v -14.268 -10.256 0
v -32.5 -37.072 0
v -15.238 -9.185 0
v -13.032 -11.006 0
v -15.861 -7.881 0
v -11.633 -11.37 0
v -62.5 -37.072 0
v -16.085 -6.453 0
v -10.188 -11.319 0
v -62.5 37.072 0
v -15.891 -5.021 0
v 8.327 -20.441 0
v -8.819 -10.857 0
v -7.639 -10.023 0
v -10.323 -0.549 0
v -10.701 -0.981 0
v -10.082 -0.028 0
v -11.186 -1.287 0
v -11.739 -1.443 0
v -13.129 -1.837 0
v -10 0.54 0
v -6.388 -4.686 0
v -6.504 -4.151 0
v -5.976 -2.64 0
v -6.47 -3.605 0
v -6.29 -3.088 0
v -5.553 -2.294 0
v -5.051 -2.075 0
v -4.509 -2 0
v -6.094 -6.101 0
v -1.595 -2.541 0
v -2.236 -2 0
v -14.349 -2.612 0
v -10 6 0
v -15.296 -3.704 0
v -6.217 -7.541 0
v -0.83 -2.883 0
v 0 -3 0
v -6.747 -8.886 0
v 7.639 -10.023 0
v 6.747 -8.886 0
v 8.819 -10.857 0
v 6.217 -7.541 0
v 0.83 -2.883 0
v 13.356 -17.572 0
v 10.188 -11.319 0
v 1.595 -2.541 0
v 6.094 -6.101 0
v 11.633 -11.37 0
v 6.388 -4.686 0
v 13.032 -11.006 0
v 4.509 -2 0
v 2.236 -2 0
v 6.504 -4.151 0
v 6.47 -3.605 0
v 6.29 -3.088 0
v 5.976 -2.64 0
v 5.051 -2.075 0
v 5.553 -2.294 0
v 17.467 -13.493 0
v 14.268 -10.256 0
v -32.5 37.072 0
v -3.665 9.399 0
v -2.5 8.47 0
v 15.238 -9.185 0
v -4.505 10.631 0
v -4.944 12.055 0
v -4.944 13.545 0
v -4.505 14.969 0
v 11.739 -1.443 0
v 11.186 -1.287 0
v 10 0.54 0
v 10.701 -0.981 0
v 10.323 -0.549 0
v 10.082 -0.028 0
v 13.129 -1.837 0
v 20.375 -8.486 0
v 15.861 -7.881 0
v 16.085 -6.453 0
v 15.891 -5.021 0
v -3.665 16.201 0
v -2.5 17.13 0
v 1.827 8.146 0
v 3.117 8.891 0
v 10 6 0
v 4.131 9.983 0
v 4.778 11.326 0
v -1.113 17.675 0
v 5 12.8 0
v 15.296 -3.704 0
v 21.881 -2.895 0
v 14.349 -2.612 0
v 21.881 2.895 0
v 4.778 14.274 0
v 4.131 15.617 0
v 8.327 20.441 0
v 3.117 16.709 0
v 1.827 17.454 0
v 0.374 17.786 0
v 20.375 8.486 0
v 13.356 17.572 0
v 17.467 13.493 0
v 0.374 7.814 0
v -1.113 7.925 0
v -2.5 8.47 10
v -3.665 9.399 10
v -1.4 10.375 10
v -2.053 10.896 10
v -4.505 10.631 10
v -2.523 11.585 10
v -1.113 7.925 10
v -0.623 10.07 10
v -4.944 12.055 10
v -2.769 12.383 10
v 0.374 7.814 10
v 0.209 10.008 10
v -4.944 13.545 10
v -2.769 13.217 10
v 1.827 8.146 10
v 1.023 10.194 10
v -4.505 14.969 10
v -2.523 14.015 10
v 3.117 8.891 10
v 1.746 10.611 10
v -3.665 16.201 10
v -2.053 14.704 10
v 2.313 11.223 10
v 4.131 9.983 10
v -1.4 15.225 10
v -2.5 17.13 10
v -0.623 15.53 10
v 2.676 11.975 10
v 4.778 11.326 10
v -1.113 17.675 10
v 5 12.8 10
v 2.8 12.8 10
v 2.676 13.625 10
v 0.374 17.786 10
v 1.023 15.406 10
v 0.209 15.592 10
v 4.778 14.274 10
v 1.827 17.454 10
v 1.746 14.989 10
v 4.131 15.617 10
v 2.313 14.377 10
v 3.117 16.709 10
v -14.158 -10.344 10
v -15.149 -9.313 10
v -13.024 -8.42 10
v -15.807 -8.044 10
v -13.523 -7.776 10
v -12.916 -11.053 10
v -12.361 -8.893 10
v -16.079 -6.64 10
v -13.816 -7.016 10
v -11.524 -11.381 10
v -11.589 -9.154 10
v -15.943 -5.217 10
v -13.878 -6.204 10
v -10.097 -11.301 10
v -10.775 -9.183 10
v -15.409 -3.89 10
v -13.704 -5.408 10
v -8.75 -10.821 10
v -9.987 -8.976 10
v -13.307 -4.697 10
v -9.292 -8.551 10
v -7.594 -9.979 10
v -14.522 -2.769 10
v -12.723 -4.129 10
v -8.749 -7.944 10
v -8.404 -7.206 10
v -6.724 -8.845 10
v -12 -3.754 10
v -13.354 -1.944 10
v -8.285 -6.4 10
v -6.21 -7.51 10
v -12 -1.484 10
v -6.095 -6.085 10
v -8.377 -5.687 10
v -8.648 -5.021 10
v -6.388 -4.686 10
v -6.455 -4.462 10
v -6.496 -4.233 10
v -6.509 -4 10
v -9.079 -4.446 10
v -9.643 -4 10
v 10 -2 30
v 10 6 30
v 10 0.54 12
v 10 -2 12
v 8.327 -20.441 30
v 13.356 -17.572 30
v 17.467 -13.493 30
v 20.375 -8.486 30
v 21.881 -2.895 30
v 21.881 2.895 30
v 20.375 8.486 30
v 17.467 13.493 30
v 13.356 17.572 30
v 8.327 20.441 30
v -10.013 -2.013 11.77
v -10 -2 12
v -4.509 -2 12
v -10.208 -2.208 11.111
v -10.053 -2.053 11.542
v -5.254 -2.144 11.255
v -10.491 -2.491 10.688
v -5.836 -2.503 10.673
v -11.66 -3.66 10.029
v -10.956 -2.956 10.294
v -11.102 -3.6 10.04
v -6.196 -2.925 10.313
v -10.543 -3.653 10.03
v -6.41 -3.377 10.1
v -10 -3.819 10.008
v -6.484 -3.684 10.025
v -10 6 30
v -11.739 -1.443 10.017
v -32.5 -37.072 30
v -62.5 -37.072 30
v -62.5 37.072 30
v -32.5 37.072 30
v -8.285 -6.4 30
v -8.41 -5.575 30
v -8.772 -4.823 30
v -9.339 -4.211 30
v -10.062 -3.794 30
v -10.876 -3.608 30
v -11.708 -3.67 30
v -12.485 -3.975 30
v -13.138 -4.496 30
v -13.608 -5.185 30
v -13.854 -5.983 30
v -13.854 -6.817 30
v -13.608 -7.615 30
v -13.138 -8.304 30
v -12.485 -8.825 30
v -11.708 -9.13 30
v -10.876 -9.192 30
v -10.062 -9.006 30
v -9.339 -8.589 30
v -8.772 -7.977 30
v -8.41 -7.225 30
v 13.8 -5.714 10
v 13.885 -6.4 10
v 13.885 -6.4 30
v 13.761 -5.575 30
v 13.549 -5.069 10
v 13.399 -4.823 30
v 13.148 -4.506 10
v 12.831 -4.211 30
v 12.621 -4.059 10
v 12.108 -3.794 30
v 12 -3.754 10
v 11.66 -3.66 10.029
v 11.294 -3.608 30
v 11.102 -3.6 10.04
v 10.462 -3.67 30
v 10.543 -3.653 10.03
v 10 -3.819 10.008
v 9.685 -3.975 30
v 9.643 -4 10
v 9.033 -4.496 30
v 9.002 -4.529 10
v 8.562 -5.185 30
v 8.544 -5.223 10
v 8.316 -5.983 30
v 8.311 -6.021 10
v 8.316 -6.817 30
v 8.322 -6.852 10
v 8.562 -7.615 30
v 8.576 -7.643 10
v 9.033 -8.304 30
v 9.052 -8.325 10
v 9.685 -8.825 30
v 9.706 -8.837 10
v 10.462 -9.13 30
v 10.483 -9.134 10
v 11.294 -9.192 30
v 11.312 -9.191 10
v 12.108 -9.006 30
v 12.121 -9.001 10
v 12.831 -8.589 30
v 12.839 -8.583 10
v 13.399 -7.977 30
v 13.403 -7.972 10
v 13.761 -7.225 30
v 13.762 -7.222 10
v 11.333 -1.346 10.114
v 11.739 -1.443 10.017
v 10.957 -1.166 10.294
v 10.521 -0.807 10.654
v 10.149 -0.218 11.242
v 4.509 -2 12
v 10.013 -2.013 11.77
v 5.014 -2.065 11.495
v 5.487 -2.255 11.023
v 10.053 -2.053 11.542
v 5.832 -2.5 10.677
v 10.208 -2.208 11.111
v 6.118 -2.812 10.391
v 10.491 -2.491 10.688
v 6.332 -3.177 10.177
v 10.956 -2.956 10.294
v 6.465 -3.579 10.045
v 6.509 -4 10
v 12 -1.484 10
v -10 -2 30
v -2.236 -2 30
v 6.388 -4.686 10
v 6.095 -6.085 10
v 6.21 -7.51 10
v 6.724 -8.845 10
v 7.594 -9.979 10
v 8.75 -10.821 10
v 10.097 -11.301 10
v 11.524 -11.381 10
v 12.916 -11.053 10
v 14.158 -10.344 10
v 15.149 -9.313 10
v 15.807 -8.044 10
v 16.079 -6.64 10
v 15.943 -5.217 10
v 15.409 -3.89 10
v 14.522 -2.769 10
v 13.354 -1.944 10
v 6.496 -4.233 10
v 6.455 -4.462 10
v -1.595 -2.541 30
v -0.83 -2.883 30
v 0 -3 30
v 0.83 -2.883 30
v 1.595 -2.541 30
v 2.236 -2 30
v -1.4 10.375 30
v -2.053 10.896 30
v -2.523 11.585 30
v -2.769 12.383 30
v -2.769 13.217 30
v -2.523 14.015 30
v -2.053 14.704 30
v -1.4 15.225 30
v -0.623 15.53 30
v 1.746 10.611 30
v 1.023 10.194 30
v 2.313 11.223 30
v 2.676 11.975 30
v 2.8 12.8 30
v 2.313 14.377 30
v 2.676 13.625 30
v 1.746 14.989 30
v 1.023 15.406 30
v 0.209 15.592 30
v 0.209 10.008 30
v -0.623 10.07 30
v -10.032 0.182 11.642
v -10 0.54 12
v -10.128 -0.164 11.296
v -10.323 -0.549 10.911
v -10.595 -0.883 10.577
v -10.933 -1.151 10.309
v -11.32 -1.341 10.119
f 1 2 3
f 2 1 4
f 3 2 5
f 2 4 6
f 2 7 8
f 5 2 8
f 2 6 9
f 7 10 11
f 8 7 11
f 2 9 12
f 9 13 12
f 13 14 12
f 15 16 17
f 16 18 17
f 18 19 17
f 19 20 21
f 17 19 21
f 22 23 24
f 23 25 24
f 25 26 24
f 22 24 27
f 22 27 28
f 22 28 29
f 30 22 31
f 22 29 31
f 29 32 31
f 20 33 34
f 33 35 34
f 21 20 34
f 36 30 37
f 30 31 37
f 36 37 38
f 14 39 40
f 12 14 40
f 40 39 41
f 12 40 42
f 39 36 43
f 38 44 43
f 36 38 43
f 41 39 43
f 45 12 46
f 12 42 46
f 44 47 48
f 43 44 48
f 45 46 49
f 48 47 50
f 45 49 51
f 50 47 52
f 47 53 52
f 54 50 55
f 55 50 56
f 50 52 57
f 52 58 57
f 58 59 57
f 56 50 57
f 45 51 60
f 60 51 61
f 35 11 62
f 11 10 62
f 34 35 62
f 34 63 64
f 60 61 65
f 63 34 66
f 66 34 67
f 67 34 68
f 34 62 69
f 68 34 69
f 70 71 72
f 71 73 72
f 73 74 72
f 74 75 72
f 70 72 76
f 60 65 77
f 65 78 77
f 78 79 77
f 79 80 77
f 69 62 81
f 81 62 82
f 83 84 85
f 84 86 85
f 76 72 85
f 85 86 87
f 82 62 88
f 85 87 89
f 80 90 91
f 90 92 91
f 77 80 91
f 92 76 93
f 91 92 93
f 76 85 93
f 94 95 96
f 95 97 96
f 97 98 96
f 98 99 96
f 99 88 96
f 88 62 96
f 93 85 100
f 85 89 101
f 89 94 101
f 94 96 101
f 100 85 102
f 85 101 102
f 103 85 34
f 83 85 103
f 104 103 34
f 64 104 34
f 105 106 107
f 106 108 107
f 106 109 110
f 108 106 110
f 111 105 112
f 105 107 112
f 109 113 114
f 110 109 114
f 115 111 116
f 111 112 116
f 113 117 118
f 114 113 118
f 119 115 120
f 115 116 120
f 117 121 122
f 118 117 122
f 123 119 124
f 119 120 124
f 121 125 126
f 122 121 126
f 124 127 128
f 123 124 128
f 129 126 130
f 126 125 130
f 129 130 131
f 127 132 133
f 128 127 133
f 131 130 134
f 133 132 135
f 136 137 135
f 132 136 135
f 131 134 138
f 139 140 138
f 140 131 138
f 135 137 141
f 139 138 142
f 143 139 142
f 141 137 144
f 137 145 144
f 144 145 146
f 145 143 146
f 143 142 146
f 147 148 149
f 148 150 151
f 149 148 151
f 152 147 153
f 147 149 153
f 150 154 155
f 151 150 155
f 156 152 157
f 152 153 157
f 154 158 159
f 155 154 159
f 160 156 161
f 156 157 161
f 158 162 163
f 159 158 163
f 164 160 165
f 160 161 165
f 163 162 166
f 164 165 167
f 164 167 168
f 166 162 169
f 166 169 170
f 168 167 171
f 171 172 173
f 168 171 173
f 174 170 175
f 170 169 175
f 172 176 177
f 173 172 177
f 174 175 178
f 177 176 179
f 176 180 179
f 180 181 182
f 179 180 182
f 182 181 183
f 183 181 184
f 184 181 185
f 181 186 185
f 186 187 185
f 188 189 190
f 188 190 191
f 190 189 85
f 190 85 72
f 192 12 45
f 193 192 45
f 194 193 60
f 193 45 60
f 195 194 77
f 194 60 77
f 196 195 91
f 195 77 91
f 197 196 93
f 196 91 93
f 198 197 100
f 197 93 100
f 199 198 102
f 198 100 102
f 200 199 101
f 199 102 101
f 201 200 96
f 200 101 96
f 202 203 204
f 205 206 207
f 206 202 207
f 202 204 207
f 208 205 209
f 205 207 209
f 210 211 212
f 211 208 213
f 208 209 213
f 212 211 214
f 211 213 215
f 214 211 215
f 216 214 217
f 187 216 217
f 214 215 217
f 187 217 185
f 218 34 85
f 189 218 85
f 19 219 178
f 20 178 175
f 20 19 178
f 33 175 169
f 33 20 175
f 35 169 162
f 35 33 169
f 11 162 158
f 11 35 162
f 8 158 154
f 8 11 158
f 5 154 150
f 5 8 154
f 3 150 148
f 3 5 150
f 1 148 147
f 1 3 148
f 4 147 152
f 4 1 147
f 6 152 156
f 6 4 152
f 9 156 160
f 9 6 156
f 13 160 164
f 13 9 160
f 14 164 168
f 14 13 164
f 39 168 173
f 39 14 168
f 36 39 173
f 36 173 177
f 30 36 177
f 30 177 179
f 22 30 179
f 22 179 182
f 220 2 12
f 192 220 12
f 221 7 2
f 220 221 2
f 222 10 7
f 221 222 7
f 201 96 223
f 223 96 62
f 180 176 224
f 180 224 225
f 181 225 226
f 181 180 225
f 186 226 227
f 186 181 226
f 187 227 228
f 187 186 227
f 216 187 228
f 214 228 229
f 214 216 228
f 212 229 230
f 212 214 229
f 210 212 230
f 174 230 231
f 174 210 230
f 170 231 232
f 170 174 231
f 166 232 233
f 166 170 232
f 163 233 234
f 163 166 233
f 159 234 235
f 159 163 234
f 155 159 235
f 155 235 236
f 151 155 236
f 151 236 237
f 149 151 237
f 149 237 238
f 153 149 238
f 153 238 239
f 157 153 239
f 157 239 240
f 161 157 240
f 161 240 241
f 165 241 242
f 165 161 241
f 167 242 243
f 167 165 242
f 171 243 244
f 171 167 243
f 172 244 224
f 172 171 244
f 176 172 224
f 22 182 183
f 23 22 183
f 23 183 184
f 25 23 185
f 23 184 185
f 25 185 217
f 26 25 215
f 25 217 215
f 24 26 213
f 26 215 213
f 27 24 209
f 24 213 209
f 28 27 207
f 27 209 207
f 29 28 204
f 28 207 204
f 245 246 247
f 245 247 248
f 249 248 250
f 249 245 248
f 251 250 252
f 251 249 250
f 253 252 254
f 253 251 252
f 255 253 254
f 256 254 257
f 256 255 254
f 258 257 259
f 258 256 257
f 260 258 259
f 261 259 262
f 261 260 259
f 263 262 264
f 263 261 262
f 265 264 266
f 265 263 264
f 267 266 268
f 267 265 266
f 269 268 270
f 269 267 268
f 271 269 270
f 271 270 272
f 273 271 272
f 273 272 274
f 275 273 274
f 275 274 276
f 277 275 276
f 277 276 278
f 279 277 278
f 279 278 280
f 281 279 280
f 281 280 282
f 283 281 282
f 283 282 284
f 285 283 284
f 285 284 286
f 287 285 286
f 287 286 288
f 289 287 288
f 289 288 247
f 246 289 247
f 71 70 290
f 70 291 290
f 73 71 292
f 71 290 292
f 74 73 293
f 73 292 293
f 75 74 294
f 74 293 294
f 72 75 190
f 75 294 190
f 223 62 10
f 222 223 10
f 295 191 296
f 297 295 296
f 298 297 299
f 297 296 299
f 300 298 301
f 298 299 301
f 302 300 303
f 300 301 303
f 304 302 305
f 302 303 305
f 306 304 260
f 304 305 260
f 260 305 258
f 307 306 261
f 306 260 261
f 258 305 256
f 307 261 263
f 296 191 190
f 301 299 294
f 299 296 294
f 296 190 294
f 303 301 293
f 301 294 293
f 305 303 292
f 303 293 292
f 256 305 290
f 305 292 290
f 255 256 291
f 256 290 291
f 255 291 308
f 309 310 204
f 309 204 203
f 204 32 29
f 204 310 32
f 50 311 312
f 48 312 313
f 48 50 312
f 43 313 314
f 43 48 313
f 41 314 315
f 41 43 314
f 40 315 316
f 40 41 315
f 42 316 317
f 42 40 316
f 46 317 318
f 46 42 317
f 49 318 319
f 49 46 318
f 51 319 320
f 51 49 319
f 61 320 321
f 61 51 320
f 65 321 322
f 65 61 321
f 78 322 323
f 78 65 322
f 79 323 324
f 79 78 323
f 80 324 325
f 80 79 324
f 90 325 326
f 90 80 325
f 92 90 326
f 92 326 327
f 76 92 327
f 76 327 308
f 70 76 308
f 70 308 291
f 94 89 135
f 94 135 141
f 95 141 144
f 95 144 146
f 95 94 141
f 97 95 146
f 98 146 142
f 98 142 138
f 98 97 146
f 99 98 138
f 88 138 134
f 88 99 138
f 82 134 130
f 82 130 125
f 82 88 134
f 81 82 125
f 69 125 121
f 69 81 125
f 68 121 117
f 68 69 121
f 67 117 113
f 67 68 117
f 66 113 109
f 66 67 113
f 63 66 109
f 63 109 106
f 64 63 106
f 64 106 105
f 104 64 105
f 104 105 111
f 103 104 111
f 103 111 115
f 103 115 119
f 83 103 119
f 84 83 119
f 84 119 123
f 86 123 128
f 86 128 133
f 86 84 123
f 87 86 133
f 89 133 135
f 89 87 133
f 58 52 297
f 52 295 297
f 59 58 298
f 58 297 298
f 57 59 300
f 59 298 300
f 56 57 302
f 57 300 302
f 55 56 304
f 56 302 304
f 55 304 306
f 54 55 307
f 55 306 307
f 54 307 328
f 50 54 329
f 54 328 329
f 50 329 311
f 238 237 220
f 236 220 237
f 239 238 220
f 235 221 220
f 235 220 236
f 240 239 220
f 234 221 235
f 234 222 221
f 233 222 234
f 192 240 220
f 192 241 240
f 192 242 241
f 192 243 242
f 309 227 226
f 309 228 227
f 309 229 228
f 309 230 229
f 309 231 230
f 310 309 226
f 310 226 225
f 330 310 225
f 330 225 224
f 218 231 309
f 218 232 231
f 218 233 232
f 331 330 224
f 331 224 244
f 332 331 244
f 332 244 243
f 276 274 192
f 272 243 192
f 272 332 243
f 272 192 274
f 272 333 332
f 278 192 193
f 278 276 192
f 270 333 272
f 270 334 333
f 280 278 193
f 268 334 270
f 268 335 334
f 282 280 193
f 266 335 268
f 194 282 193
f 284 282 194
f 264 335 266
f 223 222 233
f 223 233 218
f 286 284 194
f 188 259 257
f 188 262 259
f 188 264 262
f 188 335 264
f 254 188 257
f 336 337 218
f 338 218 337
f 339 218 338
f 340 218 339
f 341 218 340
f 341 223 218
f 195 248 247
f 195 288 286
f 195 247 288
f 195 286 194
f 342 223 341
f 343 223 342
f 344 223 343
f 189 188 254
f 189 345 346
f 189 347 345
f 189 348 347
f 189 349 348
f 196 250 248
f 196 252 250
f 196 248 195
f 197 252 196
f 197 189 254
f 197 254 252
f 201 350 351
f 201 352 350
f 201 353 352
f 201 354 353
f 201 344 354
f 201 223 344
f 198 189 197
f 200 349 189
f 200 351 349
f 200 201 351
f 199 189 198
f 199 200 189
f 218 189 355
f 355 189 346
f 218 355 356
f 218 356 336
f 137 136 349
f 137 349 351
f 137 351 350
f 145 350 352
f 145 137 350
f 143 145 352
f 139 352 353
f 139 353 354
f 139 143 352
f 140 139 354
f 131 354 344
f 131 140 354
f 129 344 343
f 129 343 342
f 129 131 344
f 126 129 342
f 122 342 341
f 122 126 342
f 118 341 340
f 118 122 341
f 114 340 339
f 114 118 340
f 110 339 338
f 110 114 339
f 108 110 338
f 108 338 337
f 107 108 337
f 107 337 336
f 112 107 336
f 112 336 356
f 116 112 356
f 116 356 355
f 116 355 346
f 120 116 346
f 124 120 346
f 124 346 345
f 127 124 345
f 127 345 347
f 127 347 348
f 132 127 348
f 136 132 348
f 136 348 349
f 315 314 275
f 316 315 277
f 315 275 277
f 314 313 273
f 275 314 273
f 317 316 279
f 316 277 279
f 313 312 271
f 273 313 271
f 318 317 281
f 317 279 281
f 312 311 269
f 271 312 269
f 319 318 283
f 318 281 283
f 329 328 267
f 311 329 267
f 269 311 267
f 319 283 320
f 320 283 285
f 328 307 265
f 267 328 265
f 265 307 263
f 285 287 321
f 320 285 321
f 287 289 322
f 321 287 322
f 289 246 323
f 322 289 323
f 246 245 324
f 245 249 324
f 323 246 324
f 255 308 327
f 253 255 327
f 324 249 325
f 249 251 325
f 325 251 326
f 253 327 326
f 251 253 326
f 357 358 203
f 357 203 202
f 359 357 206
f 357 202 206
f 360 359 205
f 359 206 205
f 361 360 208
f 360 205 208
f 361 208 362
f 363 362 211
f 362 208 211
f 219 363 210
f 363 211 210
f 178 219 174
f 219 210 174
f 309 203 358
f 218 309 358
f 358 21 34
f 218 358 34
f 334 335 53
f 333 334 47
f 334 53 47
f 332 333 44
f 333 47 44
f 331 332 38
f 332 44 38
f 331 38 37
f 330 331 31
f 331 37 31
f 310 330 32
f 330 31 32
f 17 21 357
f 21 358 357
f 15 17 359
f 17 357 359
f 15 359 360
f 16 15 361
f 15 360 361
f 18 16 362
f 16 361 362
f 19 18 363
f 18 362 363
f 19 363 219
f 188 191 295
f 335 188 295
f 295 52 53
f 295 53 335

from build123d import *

# Parameters (mm, degrees)
SKETCH_1_R          = 22.07163906423819
SKETCH_1_R_2        = 2.8
SKETCH_1_R_3        = 2.8000000000000003
EXTRUDE_1_DEPTH     = 5
SKETCH_2_R          = 22.07163906423819
SKETCH_2_R_2        = 2.8000000000000003
SKETCH_2_R_3        = 2.8
EXTRUDE_2_DEPTH     = 30
SKETCH_3_R          = 4.999999999999998
SKETCH_3_R_2        = 2.8000000000000003
SKETCH_3_R_3        = 5.000000000000001
SKETCH_3_R_4        = 2.8
SKETCH_3_R_5        = 5
CUT_EXTRUDE_1_DEPTH = 10
FILLET_2_R          = 2
FILLET_3_R          = 2


with BuildPart() as part:
    # 스케치1 → 보스-돌출1 (new body)
    with BuildSketch(Plane.XY):
        Circle(SKETCH_1_R)
        with Locations((0, 12.8)):
            Circle(SKETCH_1_R_2, mode=Mode.SUBTRACT)
        with Locations((-11.085125168440811, -6.400000000000006)):
            Circle(SKETCH_1_R_3, mode=Mode.SUBTRACT)
        with Locations((11.085125168440817, -6.399999999999997)):
            Circle(SKETCH_1_R_3, mode=Mode.SUBTRACT)
        with BuildLine():
            Line((-9.999999999999998, 5.9999999999999964), (10.000000000000002, 6.0000000000000036))
            Line((10.000000000000002, 6.0000000000000036), (10.000000000000004, -1.9999999999999964))
            Line((10.000000000000004, -1.9999999999999973), (2.236067977499654, -1.9999999999999998))
            ThreePointArc((2.236067977499691, -2.00000000000011), (-3.785e-14, -3), (-2.2360679774997423, -2.000000000000053))
            Line((-2.236067977499724, -2.0000000000000013), (-9.999999999999996, -2.0000000000000036))
            Line((-9.999999999999996, -2.0000000000000036), (-9.999999999999996, 5.9999999999999964))
        make_face(mode=Mode.SUBTRACT)
    extrude(amount=EXTRUDE_1_DEPTH)

    # 스케치2 → 보스-돌출2 (add)
    # profile 1 of 4: a face of its own
    with BuildSketch(Plane.XY):
        with BuildLine():
            ThreePointArc((8.32662123293451, -20.440759032512698), (4.242416494011306, -21.660082023698482), (-4.05e-15, -22.07163906423819))
            Line((0, -22.07163906423819), (-62.49999999999999, -22.07163906423819))
            Line((-62.49999999999999, -22.07163906423819), (-62.499999999999986, -37.07163906423819))
            Line((-62.499999999999986, -37.07163906423819), (-32.5, -37.07163906423819))
            Line((-32.5, -37.07163906423819), (8.326621232934514, -20.440759032512695))
        make_face()
    # profile 2 of 4: a face of its own
    with BuildSketch(Plane.XY):
        with BuildLine():
            ThreePointArc((-4.05e-15, -22.07163906423819), (-22.07163906423819, 2.7e-15), (1.35e-15, 22.07163906423819))
            Line((0, 22.07163906423819), (-62.49999999999999, 22.07163906423819))
            Line((-62.49999999999999, 22.07163906423819), (-62.49999999999999, -22.07163906423819))
            Line((-62.49999999999999, -22.07163906423819), (0, -22.07163906423819))
        make_face()
    # profile 3 of 4: a face of its own
    with BuildSketch(Plane.XY):
        Circle(SKETCH_2_R)
        with Locations((11.085125168440817, -6.399999999999997)):
            Circle(SKETCH_2_R_2, mode=Mode.SUBTRACT)
        with Locations((-11.085125168440811, -6.400000000000006)):
            Circle(SKETCH_2_R_2, mode=Mode.SUBTRACT)
        with Locations((0, 12.8)):
            Circle(SKETCH_2_R_3, mode=Mode.SUBTRACT)
        with BuildLine():
            ThreePointArc((-2.23606797749979, -2.0000000000000013), (8.5e-16, -3.000000000000001), (2.2360679774997907, -1.9999999999999996))
            Line((2.2360679774997907, -1.9999999999999996), (10.000000000000004, -1.9999999999999973))
            Line((10.000000000000004, -1.9999999999999973), (10.000000000000002, 6.0000000000000036))
            Line((10.000000000000002, 6.0000000000000036), (-9.999999999999996, 5.9999999999999964))
            Line((-9.999999999999996, 5.9999999999999964), (-9.999999999999996, -2.0000000000000036))
            Line((-9.999999999999996, -2.0000000000000036), (-2.23606797749979, -2.0000000000000013))
        make_face(mode=Mode.SUBTRACT)
    # profile 4 of 4: a face of its own
    with BuildSketch(Plane.XY):
        with BuildLine():
            Line((-62.49999999999999, 22.07163906423819), (0, 22.07163906423819))
            ThreePointArc((1.35e-15, 22.07163906423819), (4.242416494011311, 21.660082023698482), (8.326621232934516, 20.440759032512698))
            Line((8.326621232934514, 20.440759032512695), (-32.500000000000014, 37.07163906423818))
            Line((-32.500000000000014, 37.07163906423818), (-62.5, 37.07163906423818))
            Line((-62.5, 37.07163906423818), (-62.49999999999999, 22.07163906423819))
        make_face()
    extrude(amount=EXTRUDE_2_DEPTH)

    # 스케치3 → 컷-돌출1 (cut)
    # profile 1 of 3: a face of its own
    with BuildSketch(Plane.XY):
        with Locations((11.085125168440817, -6.399999999999997)):
            Circle(SKETCH_3_R)
        with Locations((11.085125168440817, -6.399999999999997)):
            Circle(SKETCH_3_R_2, mode=Mode.SUBTRACT)
    # profile 2 of 3: a face of its own
    with BuildSketch(Plane.XY):
        with Locations((0, 12.8)):
            Circle(SKETCH_3_R_3)
        with Locations((0, 12.8)):
            Circle(SKETCH_3_R_4, mode=Mode.SUBTRACT)
    # profile 3 of 3: a face of its own
    with BuildSketch(Plane.XY):
        with Locations((-11.085125168440811, -6.400000000000006)):
            Circle(SKETCH_3_R_5)
        with Locations((-11.085125168440811, -6.400000000000006)):
            Circle(SKETCH_3_R_2, mode=Mode.SUBTRACT)
    extrude(amount=CUT_EXTRUDE_1_DEPTH, mode=Mode.SUBTRACT)

    # 필렛2
    # the kernel refuses this fillet: 2 mm, written as the material it takes off along each edge
    with BuildSketch(Plane(origin=(10.000000000000004, -1.9999999999999971, 10), x_dir=(0, -1.1e-16, 1), z_dir=(-1, -3.1e-16, 0))) as fillet_2_piece_1_section:
        with BuildLine():
            CenterArc((FILLET_2_R, -FILLET_2_R), FILLET_2_R, 90, 90)
            Line((2.2e-16, -FILLET_2_R), (-FILLET_2_R * 0.02, -FILLET_2_R))
            Line((-FILLET_2_R * 0.02, -FILLET_2_R), (-FILLET_2_R * 0.02, FILLET_2_R * 0.02))
            Line((-FILLET_2_R * 0.02, FILLET_2_R * 0.02), (FILLET_2_R, FILLET_2_R * 0.02))
            Line((FILLET_2_R, FILLET_2_R * 0.02), (FILLET_2_R, 0))
        make_face()
    fillet_2_piece_1 = extrude(amount=6.289743248966767, mode=Mode.PRIVATE)
    fillet_2_piece_1 = fillet_2_piece_1 & Plane(origin=(11.085125168440817, -6.399999999999997, 10.38158038345629), x_dir=(1, 0, 0), z_dir=(0, 0, -1)) * Cylinder(4.999999999999998, 21, mode=Mode.PRIVATE)
    add(fillet_2_piece_1, mode=Mode.SUBTRACT)
    with BuildSketch(Plane(origin=(10.000000000000002, 3.4808301925816174, 10), x_dir=(1, 2.2e-16, 0), z_dir=(2.2e-16, -1, 0))) as fillet_2_piece_2_section:
        with BuildLine():
            CenterArc((FILLET_2_R, FILLET_2_R), FILLET_2_R, 180, 90)
            Line((0, FILLET_2_R), (-FILLET_2_R * 0.02, FILLET_2_R))
            Line((-FILLET_2_R * 0.02, FILLET_2_R), (-FILLET_2_R * 0.02, -FILLET_2_R * 0.02))
            Line((-FILLET_2_R * 0.02, -FILLET_2_R * 0.02), (FILLET_2_R, -FILLET_2_R * 0.02))
            Line((FILLET_2_R, -FILLET_2_R * 0.02), (FILLET_2_R, 0))
        make_face()
    fillet_2_piece_2 = extrude(amount=5.480830192581614, mode=Mode.PRIVATE)
    fillet_2_piece_2 = fillet_2_piece_2 & Plane(origin=(11.085125168440817, -6.399999999999997, 10.432374541535312), x_dir=(1, 0, 0), z_dir=(0, 0, -1)) * Cylinder(4.999999999999998, 19, mode=Mode.PRIVATE)
    add(fillet_2_piece_2, mode=Mode.SUBTRACT)
    with BuildSketch(Plane(origin=(10.000000000000004, -1.5191698074183817, 10), x_dir=(0.9990388643678791, 0.04383317787405267, 0), z_dir=(0, 0, -1))) as fillet_2_piece_3:
        with BuildLine():
            CenterArc((2.088335803131926, -1.9694814149172293), FILLET_2_R, 100.02209773137437, 82.49016328956924)
            Line((0.09025807439617, -2.057147770665381), (0.05029651982145572, -2.058901097780344))
            Line((0.05029651982145572, -2.058901097780344), (-0.03996155457471431, -0.00175332711496207))
            Line((-0.03996155457471431, -0.00175332711496207), (0.0069611193437724, 0.03938962829834457))
            ThreePointArc((0.0069611193437724, 0.03938962829834457), (0.8701399179716347, -0.03629646270692696), (1.733318716599498, 0.0393896282983446))
            Line((1.733318716599498, 0.0393896282983446), (1.7402798359432718, 0))
        make_face()
    extrude(amount=10, mode=Mode.SUBTRACT)
    with BuildSketch(Plane(origin=(8.710256751033235, -1.9999999999999971, 10), x_dir=(-1, -4.8e-16, 0), z_dir=(0, 0, -1))) as fillet_2_piece_4:
        with BuildLine():
            CenterArc((4.200844471701857, -1.9999999999999998), FILLET_2_R, 90, 110.05104256650594)
            Line((2.3220693605277325, -2.685714285714287), (2.28449385830425, -2.699428571428572))
            ThreePointArc((2.28449385830425, -2.699428571428572), (1.377184031846625, -1.1559743499710886), (-0.01899894733926109, -0.0351999999999999))
            Line((-0.01899894733926109, -0.0351999999999999), (-2e-17, 0.04000000000000004))
            Line((-2e-17, 0.04000000000000004), (4.200844471701857, 0.04000000000000004))
            Line((4.200844471701857, 0.04000000000000004), (4.200844471701857, 0))
        make_face()
    extrude(amount=10, mode=Mode.SUBTRACT)
    with BuildSketch(Plane(origin=(15.000000000000004, -1.9999999999999958, 10), x_dir=(0, 1.1e-16, 1), z_dir=(-1, -3.1e-16, 0))) as fillet_2_piece_5a_section:
        with BuildLine():
            CenterArc((FILLET_2_R, -FILLET_2_R), FILLET_2_R, 90, 90)
            Line((-2.2e-16, -FILLET_2_R), (-FILLET_2_R * 0.02, -FILLET_2_R))
            Line((-FILLET_2_R * 0.02, -FILLET_2_R), (-FILLET_2_R * 0.02, FILLET_2_R * 0.02))
            Line((-FILLET_2_R * 0.02, FILLET_2_R * 0.02), (FILLET_2_R, FILLET_2_R * 0.02))
            Line((FILLET_2_R, FILLET_2_R * 0.02), (FILLET_2_R, 0))
        make_face()
    fillet_2_piece_5a = extrude(amount=11.289743248966767, mode=Mode.PRIVATE)
    fillet_2_piece_5a = split(fillet_2_piece_5a, bisect_by=Plane(origin=(10.000000000000004, -2.502531092165931, 10.420578352743194), z_dir=(1, 2.2e-16, 0)), keep=Keep.TOP, mode=Mode.PRIVATE)
    fillet_2_piece_5a = fillet_2_piece_5a & Plane(origin=(11.085125168440817, -6.399999999999997, 10.420578352743194), x_dir=(1, 0, 0), z_dir=(0, 0, -1)) * Cylinder(4.999999999999998, 31, mode=Mode.PRIVATE)
    with BuildSketch(Plane(origin=(10.000000000000002, 3.4808301925816174, 10), x_dir=(1, 2.2e-16, 0), z_dir=(2.2e-16, -1, 0))) as fillet_2_piece_5b_section:
        with BuildLine():
            CenterArc((FILLET_2_R, FILLET_2_R), FILLET_2_R, 180, 90)
            Line((0, FILLET_2_R), (-FILLET_2_R * 0.02, FILLET_2_R))
            Line((-FILLET_2_R * 0.02, FILLET_2_R), (-FILLET_2_R * 0.02, -FILLET_2_R * 0.02))
            Line((-FILLET_2_R * 0.02, -FILLET_2_R * 0.02), (FILLET_2_R, -FILLET_2_R * 0.02))
            Line((FILLET_2_R, -FILLET_2_R * 0.02), (FILLET_2_R, 0))
        make_face()
    fillet_2_piece_5b = extrude(amount=10.480830192581614, mode=Mode.PRIVATE)
    fillet_2_piece_5b = split(fillet_2_piece_5b, bisect_by=Plane(origin=(10.452790228533653, -1.9999999999999971, 10.452790228533651), z_dir=(3.1e-16, -1, 0)), keep=Keep.TOP, mode=Mode.PRIVATE)
    fillet_2_piece_5 = fillet_2_piece_5a & fillet_2_piece_5b
    add(fillet_2_piece_5, mode=Mode.SUBTRACT)
    with BuildSketch(Plane(origin=(10.000000000000004, -1.9999999999999971, 10), x_dir=(0, -1.1e-16, 1), z_dir=(-1, -3.1e-16, 0))) as fillet_2_piece_6a_section:
        with BuildLine():
            CenterArc((FILLET_2_R, -FILLET_2_R), FILLET_2_R, 90, 90)
            Line((2.2e-16, -FILLET_2_R), (-FILLET_2_R * 0.02, -FILLET_2_R))
            Line((-FILLET_2_R * 0.02, -FILLET_2_R), (-FILLET_2_R * 0.02, FILLET_2_R * 0.02))
            Line((-FILLET_2_R * 0.02, FILLET_2_R * 0.02), (FILLET_2_R, FILLET_2_R * 0.02))
            Line((FILLET_2_R, FILLET_2_R * 0.02), (FILLET_2_R, 0))
        make_face()
    fillet_2_piece_6a = extrude(amount=6.289743248966767, mode=Mode.PRIVATE)
    fillet_2_piece_6a = fillet_2_piece_6a - Plane(origin=(11.085125168440817, -6.399999999999997, 10.483868108207538), x_dir=(1, 0, 0), z_dir=(0, 0, -1)) * Cylinder(4.999999999999998, 21, mode=Mode.PRIVATE)
    with BuildSketch(Plane(origin=(8.710256751033235, -1.9999999999999978, 20.50211117925464), x_dir=(-1, -3.2e-16, 0), z_dir=(0, 0, -1))) as fillet_2_piece_6b_section:
        with BuildLine():
            CenterArc((4.200844471701857, -2), FILLET_2_R, 90, 110.05104256650594)
            Line((2.322069360527732, -2.6857142857142864), (2.2844938583042493, -2.6994285714285717))
            ThreePointArc((2.2844938583042493, -2.6994285714285717), (1.377184031846625, -1.1559743499710882), (-0.0189989473392611, -0.03520000000000013))
            Line((-0.0189989473392611, -0.03520000000000013), (-1e-17, 0.04000000000000004))
            Line((-1e-17, 0.04000000000000004), (4.200844471701857, 0.04000000000000004))
            Line((4.200844471701857, 0.04000000000000004), (4.200844471701857, 0))
        make_face()
    fillet_2_piece_6b = extrude(amount=20.50211117925464, mode=Mode.PRIVATE)
    fillet_2_piece_6b = split(fillet_2_piece_6b, bisect_by=Plane(origin=(6.847484840256227, -2.622929884274402, 10), z_dir=(0, 0, 1)), keep=Keep.TOP, mode=Mode.PRIVATE)
    fillet_2_piece_6 = fillet_2_piece_6a & fillet_2_piece_6b
    add(fillet_2_piece_6, mode=Mode.SUBTRACT)
    with BuildSketch(Plane(origin=(10.000000000000004, -1.5191698074183826, 15.147817177180084), x_dir=(0.9990388643678791, 0.043833177874053185, 0), z_dir=(0, 0, -1))) as fillet_2_piece_7a_section:
        with BuildLine():
            CenterArc((2.0883358031319275, -1.969481414917229), FILLET_2_R, 100.02209773137442, 82.49016328956924)
            Line((0.09025807439617109, -2.057147770665382), (0.05029651982145682, -2.058901097780345))
            Line((0.05029651982145682, -2.058901097780345), (-0.03996155457471431, -0.00175332711496209))
            Line((-0.03996155457471431, -0.00175332711496209), (0.00696111934377238, 0.03938962829834458))
            ThreePointArc((0.00696111934377238, 0.03938962829834458), (0.8701399179716348, -0.03629646270692741), (1.7333187165994983, 0.0393896282983446))
            Line((1.7333187165994983, 0.0393896282983446), (1.7402798359432718, 0))
        make_face()
    fillet_2_piece_7a = extrude(amount=15.147817177180084, mode=Mode.PRIVATE)
    fillet_2_piece_7a = split(fillet_2_piece_7a, bisect_by=Plane(origin=(10.391792532024441, -0.9771675464374212, 10), z_dir=(0, 0, 1)), keep=Keep.TOP, mode=Mode.PRIVATE)
    with BuildSketch(Plane(origin=(10.000000000000002, 3.4808301925816174, 10), x_dir=(1, 2.2e-16, 0), z_dir=(2.2e-16, -1, 0))) as fillet_2_piece_7b_section:
        with BuildLine():
            CenterArc((FILLET_2_R, FILLET_2_R), FILLET_2_R, 180, 90)
            Line((0, FILLET_2_R), (-FILLET_2_R * 0.02, FILLET_2_R))
            Line((-FILLET_2_R * 0.02, FILLET_2_R), (-FILLET_2_R * 0.02, -FILLET_2_R * 0.02))
            Line((-FILLET_2_R * 0.02, -FILLET_2_R * 0.02), (FILLET_2_R, -FILLET_2_R * 0.02))
            Line((FILLET_2_R, -FILLET_2_R * 0.02), (FILLET_2_R, 0))
        make_face()
    fillet_2_piece_7b = extrude(amount=5.480830192581614, mode=Mode.PRIVATE)
    fillet_2_piece_7b = fillet_2_piece_7b - Plane(origin=(11.085125168440817, -6.399999999999997, 10.455025581015375), x_dir=(1, 0, 0), z_dir=(0, 0, -1)) * Cylinder(4.999999999999998, 19, mode=Mode.PRIVATE)
    fillet_2_piece_7 = fillet_2_piece_7a & fillet_2_piece_7b
    add(fillet_2_piece_7, mode=Mode.SUBTRACT)

    # 필렛3
    # the kernel refuses this fillet: 2 mm, written as the material it takes off along each edge
    with BuildSketch(Plane(origin=(-3.7102567510332314, -2.0000000000000018, 10), x_dir=(2.9e-16, -1, 0), z_dir=(-1, -2.9e-16, 0))) as fillet_3_piece_1_section:
        with BuildLine():
            CenterArc((FILLET_3_R, FILLET_3_R), FILLET_3_R, 180, 90)
            Line((0, FILLET_3_R), (-FILLET_3_R * 0.02, FILLET_3_R))
            Line((-FILLET_3_R * 0.02, FILLET_3_R), (-FILLET_3_R * 0.02, -FILLET_3_R * 0.02))
            Line((-FILLET_3_R * 0.02, -FILLET_3_R * 0.02), (FILLET_3_R, -FILLET_3_R * 0.02))
            Line((FILLET_3_R, -FILLET_3_R * 0.02), (FILLET_3_R, 0))
        make_face()
    fillet_3_piece_1 = extrude(amount=6.289743248966765, mode=Mode.PRIVATE)
    fillet_3_piece_1 = fillet_3_piece_1 & Plane(origin=(-11.085125168440811, -6.400000000000006, 10.381589776763924), x_dir=(1, 0, 0), z_dir=(0, 0, -1)) * Cylinder(5, 21, mode=Mode.PRIVATE)
    add(fillet_3_piece_1, mode=Mode.SUBTRACT)
    with BuildSketch(Plane(origin=(-9.999999999999996, -1.5191698074183897, 10), x_dir=(0, 1, 0), z_dir=(0, 0, -1))) as fillet_3_piece_2:
        with BuildLine():
            CenterArc((2.05912687087204, -2), FILLET_3_R, 90, 82.49016328956796)
            Line((0.07628199559958171, -1.7386071909830925), (0.0366250980941325, -1.7333793348027537))
            ThreePointArc((0.0366250980941325, -1.7333793348027537), (0.07440257468306455, -0.8677126061855152), (-0.03904664154065296, -0.00868100134752581))
            Line((-0.03904664154065296, -0.00868100134752581), (0, 0.03999999999999915))
            Line((0, 0.03999999999999915), (2.05912687087204, 0.03999999999999915))
            Line((2.05912687087204, 0.03999999999999915), (2.05912687087204, 0))
        make_face()
    extrude(amount=10, mode=Mode.SUBTRACT)
    with BuildSketch(Plane(origin=(-8.710256751033231, -2.0000000000000036, 10), x_dir=(0.6540374294413133, -0.7564621873496382, 0), z_dir=(0, 0, -1))) as fillet_3_piece_3:
        with BuildLine():
            CenterArc((4.260433894453909, -1.8697051388965966), FILLET_3_R, 110.79566042858305, 110.05104256650594)
            Line((2.747509519754633, -3.1777799977792234), (2.7172510322606476, -3.203941494956876))
            Line((2.7172510322606476, -3.203941494956876), (-0.03025848749398555, -0.02616149717765255))
            Line((-0.03025848749398555, -0.02616149717765255), (0.01420144631484614, 0.03739410277793235))
            ThreePointArc((0.01420144631484614, 0.03739410277793235), (1.775180789355795, -0.28573715275850864), (3.5361601323967444, 0.03739410277793173))
            Line((3.5361601323967444, 0.03739410277793173), (3.550361578711591, 3e-17))
        make_face()
    extrude(amount=10, mode=Mode.SUBTRACT)
    with BuildSketch(Plane(origin=(-9.999999999999996, -2.0000000000000036, 10), x_dir=(0, 0, 1), z_dir=(0, 1, 0))) as fillet_3_piece_4_section:
        with BuildLine():
            CenterArc((FILLET_3_R, -FILLET_3_R), FILLET_3_R, 90, 90)
            Line((0, -FILLET_3_R), (-FILLET_3_R * 0.02, -FILLET_3_R))
            Line((-FILLET_3_R * 0.02, -FILLET_3_R), (-FILLET_3_R * 0.02, FILLET_3_R * 0.02))
            Line((-FILLET_3_R * 0.02, FILLET_3_R * 0.02), (FILLET_3_R, FILLET_3_R * 0.02))
            Line((FILLET_3_R, FILLET_3_R * 0.02), (FILLET_3_R, 0))
        make_face()
    fillet_3_piece_4 = extrude(amount=5.480830192581614, mode=Mode.PRIVATE)
    fillet_3_piece_4 = fillet_3_piece_4 & Plane(origin=(-11.085125168440811, -6.400000000000006, 10.43237487449388), x_dir=(1, 0, 0), z_dir=(0, 0, -1)) * Cylinder(5, 19, mode=Mode.PRIVATE)
    add(fillet_3_piece_4, mode=Mode.SUBTRACT)
    with BuildSketch(Plane(origin=(-8.710256751033231, -2.0000000000000036, 20.50211117925464), x_dir=(0.6540374294413133, -0.7564621873496382, 0), z_dir=(0, 0, -1))) as fillet_3_piece_5a_section:
        with BuildLine():
            CenterArc((4.260433894453909, -1.8697051388965966), FILLET_3_R, 110.79566042858305, 110.05104256650594)
            Line((2.747509519754633, -3.1777799977792234), (2.7172510322606476, -3.203941494956876))
            Line((2.7172510322606476, -3.203941494956876), (-0.03025848749398555, -0.02616149717765255))
            Line((-0.03025848749398555, -0.02616149717765255), (0.01420144631484614, 0.03739410277793235))
            ThreePointArc((0.01420144631484614, 0.03739410277793235), (1.775180789355795, -0.28573715275850864), (3.5361601323967444, 0.03739410277793173))
            Line((3.5361601323967444, 0.03739410277793173), (3.550361578711591, 3e-17))
        make_face()
    fillet_3_piece_5a = extrude(amount=20.50211117925464, mode=Mode.PRIVATE)
    fillet_3_piece_5a = split(fillet_3_piece_5a, bisect_by=Plane(origin=(-6.847484840256223, -2.622929884274406, 10), z_dir=(0, 0, 1)), keep=Keep.TOP, mode=Mode.PRIVATE)
    with BuildSketch(Plane(origin=(-3.7102567510332314, -2.0000000000000018, 10), x_dir=(2.9e-16, -1, 0), z_dir=(-1, -2.9e-16, 0))) as fillet_3_piece_5b_section:
        with BuildLine():
            CenterArc((FILLET_3_R, FILLET_3_R), FILLET_3_R, 180, 90)
            Line((0, FILLET_3_R), (-FILLET_3_R * 0.02, FILLET_3_R))
            Line((-FILLET_3_R * 0.02, FILLET_3_R), (-FILLET_3_R * 0.02, -FILLET_3_R * 0.02))
            Line((-FILLET_3_R * 0.02, -FILLET_3_R * 0.02), (FILLET_3_R, -FILLET_3_R * 0.02))
            Line((FILLET_3_R, -FILLET_3_R * 0.02), (FILLET_3_R, 0))
        make_face()
    fillet_3_piece_5b = extrude(amount=6.289743248966765, mode=Mode.PRIVATE)
    fillet_3_piece_5b = fillet_3_piece_5b - Plane(origin=(-11.085125168440811, -6.400000000000006, 10.483871552130461), x_dir=(1, 0, 0), z_dir=(0, 0, -1)) * Cylinder(5, 21, mode=Mode.PRIVATE)
    fillet_3_piece_5 = fillet_3_piece_5a & fillet_3_piece_5b
    add(fillet_3_piece_5, mode=Mode.SUBTRACT)
    with BuildSketch(Plane(origin=(-9.999999999999996, -7.0000000000000036, 10), x_dir=(0, 0, 1), z_dir=(0, 1, 0))) as fillet_3_piece_6a_section:
        with BuildLine():
            CenterArc((FILLET_3_R, -FILLET_3_R), FILLET_3_R, 90, 90)
            Line((0, -FILLET_3_R), (-FILLET_3_R * 0.02, -FILLET_3_R))
            Line((-FILLET_3_R * 0.02, -FILLET_3_R), (-FILLET_3_R * 0.02, FILLET_3_R * 0.02))
            Line((-FILLET_3_R * 0.02, FILLET_3_R * 0.02), (FILLET_3_R, FILLET_3_R * 0.02))
            Line((FILLET_3_R, FILLET_3_R * 0.02), (FILLET_3_R, 0))
        make_face()
    fillet_3_piece_6a = extrude(amount=10.480830192581614, mode=Mode.PRIVATE)
    fillet_3_piece_6a = split(fillet_3_piece_6a, bisect_by=Plane(origin=(-10.45279022853365, -2.0000000000000036, 10.452790228533653), z_dir=(2.9e-16, -1, 0)), keep=Keep.TOP, mode=Mode.PRIVATE)
    with BuildSketch(Plane(origin=(-3.7102567510332314, -2.0000000000000018, 10), x_dir=(2.9e-16, -1, 0), z_dir=(-1, -2.9e-16, 0))) as fillet_3_piece_6b_section:
        with BuildLine():
            CenterArc((FILLET_3_R, FILLET_3_R), FILLET_3_R, 180, 90)
            Line((0, FILLET_3_R), (-FILLET_3_R * 0.02, FILLET_3_R))
            Line((-FILLET_3_R * 0.02, FILLET_3_R), (-FILLET_3_R * 0.02, -FILLET_3_R * 0.02))
            Line((-FILLET_3_R * 0.02, -FILLET_3_R * 0.02), (FILLET_3_R, -FILLET_3_R * 0.02))
            Line((FILLET_3_R, -FILLET_3_R * 0.02), (FILLET_3_R, 0))
        make_face()
    fillet_3_piece_6b = extrude(amount=11.289743248966765, mode=Mode.PRIVATE)
    fillet_3_piece_6b = split(fillet_3_piece_6b, bisect_by=Plane(origin=(-9.999999999999996, -2.5025307306861846, 10.420575876656605), z_dir=(-1, 0, 0)), keep=Keep.TOP, mode=Mode.PRIVATE)
    fillet_3_piece_6b = fillet_3_piece_6b & Plane(origin=(-11.085125168440811, -6.400000000000006, 10.420575876656605), x_dir=(1, 0, 0), z_dir=(0, 0, -1)) * Cylinder(5, 31, mode=Mode.PRIVATE)
    fillet_3_piece_6 = fillet_3_piece_6a & fillet_3_piece_6b
    add(fillet_3_piece_6, mode=Mode.SUBTRACT)
    with BuildSketch(Plane(origin=(-9.999999999999996, -2.0000000000000036, 10), x_dir=(0, 0, 1), z_dir=(0, 1, 0))) as fillet_3_piece_7a_section:
        with BuildLine():
            CenterArc((FILLET_3_R, -FILLET_3_R), FILLET_3_R, 90, 90)
            Line((0, -FILLET_3_R), (-FILLET_3_R * 0.02, -FILLET_3_R))
            Line((-FILLET_3_R * 0.02, -FILLET_3_R), (-FILLET_3_R * 0.02, FILLET_3_R * 0.02))
            Line((-FILLET_3_R * 0.02, FILLET_3_R * 0.02), (FILLET_3_R, FILLET_3_R * 0.02))
            Line((FILLET_3_R, FILLET_3_R * 0.02), (FILLET_3_R, 0))
        make_face()
    fillet_3_piece_7a = extrude(amount=5.480830192581614, mode=Mode.PRIVATE)
    fillet_3_piece_7a = fillet_3_piece_7a - Plane(origin=(-11.085125168440811, -6.400000000000006, 10.455025772702653), x_dir=(1, 0, 0), z_dir=(0, 0, -1)) * Cylinder(5, 19, mode=Mode.PRIVATE)
    with BuildSketch(Plane(origin=(-9.999999999999996, -1.5191698074183897, 15.1478171771801), x_dir=(0, 1, 0), z_dir=(0, 0, -1))) as fillet_3_piece_7b_section:
        with BuildLine():
            CenterArc((2.05912687087204, -2), FILLET_3_R, 90, 82.49016328956796)
            Line((0.07628199559958171, -1.7386071909830925), (0.0366250980941325, -1.7333793348027537))
            ThreePointArc((0.0366250980941325, -1.7333793348027537), (0.07440257468306455, -0.8677126061855152), (-0.03904664154065296, -0.00868100134752581))
            Line((-0.03904664154065296, -0.00868100134752581), (0, 0.03999999999999915))
            Line((0, 0.03999999999999915), (2.05912687087204, 0.03999999999999915))
            Line((2.05912687087204, 0.03999999999999915), (2.05912687087204, 0))
        make_face()
    fillet_3_piece_7b = extrude(amount=15.1478171771801, mode=Mode.PRIVATE)
    fillet_3_piece_7b = split(fillet_3_piece_7b, bisect_by=Plane(origin=(-10.39179253202446, -0.9771675464374194, 10), z_dir=(0, 0, 1)), keep=Keep.TOP, mode=Mode.PRIVATE)
    fillet_3_piece_7 = fillet_3_piece_7a & fillet_3_piece_7b
    add(fillet_3_piece_7, mode=Mode.SUBTRACT)


solid = part.part
